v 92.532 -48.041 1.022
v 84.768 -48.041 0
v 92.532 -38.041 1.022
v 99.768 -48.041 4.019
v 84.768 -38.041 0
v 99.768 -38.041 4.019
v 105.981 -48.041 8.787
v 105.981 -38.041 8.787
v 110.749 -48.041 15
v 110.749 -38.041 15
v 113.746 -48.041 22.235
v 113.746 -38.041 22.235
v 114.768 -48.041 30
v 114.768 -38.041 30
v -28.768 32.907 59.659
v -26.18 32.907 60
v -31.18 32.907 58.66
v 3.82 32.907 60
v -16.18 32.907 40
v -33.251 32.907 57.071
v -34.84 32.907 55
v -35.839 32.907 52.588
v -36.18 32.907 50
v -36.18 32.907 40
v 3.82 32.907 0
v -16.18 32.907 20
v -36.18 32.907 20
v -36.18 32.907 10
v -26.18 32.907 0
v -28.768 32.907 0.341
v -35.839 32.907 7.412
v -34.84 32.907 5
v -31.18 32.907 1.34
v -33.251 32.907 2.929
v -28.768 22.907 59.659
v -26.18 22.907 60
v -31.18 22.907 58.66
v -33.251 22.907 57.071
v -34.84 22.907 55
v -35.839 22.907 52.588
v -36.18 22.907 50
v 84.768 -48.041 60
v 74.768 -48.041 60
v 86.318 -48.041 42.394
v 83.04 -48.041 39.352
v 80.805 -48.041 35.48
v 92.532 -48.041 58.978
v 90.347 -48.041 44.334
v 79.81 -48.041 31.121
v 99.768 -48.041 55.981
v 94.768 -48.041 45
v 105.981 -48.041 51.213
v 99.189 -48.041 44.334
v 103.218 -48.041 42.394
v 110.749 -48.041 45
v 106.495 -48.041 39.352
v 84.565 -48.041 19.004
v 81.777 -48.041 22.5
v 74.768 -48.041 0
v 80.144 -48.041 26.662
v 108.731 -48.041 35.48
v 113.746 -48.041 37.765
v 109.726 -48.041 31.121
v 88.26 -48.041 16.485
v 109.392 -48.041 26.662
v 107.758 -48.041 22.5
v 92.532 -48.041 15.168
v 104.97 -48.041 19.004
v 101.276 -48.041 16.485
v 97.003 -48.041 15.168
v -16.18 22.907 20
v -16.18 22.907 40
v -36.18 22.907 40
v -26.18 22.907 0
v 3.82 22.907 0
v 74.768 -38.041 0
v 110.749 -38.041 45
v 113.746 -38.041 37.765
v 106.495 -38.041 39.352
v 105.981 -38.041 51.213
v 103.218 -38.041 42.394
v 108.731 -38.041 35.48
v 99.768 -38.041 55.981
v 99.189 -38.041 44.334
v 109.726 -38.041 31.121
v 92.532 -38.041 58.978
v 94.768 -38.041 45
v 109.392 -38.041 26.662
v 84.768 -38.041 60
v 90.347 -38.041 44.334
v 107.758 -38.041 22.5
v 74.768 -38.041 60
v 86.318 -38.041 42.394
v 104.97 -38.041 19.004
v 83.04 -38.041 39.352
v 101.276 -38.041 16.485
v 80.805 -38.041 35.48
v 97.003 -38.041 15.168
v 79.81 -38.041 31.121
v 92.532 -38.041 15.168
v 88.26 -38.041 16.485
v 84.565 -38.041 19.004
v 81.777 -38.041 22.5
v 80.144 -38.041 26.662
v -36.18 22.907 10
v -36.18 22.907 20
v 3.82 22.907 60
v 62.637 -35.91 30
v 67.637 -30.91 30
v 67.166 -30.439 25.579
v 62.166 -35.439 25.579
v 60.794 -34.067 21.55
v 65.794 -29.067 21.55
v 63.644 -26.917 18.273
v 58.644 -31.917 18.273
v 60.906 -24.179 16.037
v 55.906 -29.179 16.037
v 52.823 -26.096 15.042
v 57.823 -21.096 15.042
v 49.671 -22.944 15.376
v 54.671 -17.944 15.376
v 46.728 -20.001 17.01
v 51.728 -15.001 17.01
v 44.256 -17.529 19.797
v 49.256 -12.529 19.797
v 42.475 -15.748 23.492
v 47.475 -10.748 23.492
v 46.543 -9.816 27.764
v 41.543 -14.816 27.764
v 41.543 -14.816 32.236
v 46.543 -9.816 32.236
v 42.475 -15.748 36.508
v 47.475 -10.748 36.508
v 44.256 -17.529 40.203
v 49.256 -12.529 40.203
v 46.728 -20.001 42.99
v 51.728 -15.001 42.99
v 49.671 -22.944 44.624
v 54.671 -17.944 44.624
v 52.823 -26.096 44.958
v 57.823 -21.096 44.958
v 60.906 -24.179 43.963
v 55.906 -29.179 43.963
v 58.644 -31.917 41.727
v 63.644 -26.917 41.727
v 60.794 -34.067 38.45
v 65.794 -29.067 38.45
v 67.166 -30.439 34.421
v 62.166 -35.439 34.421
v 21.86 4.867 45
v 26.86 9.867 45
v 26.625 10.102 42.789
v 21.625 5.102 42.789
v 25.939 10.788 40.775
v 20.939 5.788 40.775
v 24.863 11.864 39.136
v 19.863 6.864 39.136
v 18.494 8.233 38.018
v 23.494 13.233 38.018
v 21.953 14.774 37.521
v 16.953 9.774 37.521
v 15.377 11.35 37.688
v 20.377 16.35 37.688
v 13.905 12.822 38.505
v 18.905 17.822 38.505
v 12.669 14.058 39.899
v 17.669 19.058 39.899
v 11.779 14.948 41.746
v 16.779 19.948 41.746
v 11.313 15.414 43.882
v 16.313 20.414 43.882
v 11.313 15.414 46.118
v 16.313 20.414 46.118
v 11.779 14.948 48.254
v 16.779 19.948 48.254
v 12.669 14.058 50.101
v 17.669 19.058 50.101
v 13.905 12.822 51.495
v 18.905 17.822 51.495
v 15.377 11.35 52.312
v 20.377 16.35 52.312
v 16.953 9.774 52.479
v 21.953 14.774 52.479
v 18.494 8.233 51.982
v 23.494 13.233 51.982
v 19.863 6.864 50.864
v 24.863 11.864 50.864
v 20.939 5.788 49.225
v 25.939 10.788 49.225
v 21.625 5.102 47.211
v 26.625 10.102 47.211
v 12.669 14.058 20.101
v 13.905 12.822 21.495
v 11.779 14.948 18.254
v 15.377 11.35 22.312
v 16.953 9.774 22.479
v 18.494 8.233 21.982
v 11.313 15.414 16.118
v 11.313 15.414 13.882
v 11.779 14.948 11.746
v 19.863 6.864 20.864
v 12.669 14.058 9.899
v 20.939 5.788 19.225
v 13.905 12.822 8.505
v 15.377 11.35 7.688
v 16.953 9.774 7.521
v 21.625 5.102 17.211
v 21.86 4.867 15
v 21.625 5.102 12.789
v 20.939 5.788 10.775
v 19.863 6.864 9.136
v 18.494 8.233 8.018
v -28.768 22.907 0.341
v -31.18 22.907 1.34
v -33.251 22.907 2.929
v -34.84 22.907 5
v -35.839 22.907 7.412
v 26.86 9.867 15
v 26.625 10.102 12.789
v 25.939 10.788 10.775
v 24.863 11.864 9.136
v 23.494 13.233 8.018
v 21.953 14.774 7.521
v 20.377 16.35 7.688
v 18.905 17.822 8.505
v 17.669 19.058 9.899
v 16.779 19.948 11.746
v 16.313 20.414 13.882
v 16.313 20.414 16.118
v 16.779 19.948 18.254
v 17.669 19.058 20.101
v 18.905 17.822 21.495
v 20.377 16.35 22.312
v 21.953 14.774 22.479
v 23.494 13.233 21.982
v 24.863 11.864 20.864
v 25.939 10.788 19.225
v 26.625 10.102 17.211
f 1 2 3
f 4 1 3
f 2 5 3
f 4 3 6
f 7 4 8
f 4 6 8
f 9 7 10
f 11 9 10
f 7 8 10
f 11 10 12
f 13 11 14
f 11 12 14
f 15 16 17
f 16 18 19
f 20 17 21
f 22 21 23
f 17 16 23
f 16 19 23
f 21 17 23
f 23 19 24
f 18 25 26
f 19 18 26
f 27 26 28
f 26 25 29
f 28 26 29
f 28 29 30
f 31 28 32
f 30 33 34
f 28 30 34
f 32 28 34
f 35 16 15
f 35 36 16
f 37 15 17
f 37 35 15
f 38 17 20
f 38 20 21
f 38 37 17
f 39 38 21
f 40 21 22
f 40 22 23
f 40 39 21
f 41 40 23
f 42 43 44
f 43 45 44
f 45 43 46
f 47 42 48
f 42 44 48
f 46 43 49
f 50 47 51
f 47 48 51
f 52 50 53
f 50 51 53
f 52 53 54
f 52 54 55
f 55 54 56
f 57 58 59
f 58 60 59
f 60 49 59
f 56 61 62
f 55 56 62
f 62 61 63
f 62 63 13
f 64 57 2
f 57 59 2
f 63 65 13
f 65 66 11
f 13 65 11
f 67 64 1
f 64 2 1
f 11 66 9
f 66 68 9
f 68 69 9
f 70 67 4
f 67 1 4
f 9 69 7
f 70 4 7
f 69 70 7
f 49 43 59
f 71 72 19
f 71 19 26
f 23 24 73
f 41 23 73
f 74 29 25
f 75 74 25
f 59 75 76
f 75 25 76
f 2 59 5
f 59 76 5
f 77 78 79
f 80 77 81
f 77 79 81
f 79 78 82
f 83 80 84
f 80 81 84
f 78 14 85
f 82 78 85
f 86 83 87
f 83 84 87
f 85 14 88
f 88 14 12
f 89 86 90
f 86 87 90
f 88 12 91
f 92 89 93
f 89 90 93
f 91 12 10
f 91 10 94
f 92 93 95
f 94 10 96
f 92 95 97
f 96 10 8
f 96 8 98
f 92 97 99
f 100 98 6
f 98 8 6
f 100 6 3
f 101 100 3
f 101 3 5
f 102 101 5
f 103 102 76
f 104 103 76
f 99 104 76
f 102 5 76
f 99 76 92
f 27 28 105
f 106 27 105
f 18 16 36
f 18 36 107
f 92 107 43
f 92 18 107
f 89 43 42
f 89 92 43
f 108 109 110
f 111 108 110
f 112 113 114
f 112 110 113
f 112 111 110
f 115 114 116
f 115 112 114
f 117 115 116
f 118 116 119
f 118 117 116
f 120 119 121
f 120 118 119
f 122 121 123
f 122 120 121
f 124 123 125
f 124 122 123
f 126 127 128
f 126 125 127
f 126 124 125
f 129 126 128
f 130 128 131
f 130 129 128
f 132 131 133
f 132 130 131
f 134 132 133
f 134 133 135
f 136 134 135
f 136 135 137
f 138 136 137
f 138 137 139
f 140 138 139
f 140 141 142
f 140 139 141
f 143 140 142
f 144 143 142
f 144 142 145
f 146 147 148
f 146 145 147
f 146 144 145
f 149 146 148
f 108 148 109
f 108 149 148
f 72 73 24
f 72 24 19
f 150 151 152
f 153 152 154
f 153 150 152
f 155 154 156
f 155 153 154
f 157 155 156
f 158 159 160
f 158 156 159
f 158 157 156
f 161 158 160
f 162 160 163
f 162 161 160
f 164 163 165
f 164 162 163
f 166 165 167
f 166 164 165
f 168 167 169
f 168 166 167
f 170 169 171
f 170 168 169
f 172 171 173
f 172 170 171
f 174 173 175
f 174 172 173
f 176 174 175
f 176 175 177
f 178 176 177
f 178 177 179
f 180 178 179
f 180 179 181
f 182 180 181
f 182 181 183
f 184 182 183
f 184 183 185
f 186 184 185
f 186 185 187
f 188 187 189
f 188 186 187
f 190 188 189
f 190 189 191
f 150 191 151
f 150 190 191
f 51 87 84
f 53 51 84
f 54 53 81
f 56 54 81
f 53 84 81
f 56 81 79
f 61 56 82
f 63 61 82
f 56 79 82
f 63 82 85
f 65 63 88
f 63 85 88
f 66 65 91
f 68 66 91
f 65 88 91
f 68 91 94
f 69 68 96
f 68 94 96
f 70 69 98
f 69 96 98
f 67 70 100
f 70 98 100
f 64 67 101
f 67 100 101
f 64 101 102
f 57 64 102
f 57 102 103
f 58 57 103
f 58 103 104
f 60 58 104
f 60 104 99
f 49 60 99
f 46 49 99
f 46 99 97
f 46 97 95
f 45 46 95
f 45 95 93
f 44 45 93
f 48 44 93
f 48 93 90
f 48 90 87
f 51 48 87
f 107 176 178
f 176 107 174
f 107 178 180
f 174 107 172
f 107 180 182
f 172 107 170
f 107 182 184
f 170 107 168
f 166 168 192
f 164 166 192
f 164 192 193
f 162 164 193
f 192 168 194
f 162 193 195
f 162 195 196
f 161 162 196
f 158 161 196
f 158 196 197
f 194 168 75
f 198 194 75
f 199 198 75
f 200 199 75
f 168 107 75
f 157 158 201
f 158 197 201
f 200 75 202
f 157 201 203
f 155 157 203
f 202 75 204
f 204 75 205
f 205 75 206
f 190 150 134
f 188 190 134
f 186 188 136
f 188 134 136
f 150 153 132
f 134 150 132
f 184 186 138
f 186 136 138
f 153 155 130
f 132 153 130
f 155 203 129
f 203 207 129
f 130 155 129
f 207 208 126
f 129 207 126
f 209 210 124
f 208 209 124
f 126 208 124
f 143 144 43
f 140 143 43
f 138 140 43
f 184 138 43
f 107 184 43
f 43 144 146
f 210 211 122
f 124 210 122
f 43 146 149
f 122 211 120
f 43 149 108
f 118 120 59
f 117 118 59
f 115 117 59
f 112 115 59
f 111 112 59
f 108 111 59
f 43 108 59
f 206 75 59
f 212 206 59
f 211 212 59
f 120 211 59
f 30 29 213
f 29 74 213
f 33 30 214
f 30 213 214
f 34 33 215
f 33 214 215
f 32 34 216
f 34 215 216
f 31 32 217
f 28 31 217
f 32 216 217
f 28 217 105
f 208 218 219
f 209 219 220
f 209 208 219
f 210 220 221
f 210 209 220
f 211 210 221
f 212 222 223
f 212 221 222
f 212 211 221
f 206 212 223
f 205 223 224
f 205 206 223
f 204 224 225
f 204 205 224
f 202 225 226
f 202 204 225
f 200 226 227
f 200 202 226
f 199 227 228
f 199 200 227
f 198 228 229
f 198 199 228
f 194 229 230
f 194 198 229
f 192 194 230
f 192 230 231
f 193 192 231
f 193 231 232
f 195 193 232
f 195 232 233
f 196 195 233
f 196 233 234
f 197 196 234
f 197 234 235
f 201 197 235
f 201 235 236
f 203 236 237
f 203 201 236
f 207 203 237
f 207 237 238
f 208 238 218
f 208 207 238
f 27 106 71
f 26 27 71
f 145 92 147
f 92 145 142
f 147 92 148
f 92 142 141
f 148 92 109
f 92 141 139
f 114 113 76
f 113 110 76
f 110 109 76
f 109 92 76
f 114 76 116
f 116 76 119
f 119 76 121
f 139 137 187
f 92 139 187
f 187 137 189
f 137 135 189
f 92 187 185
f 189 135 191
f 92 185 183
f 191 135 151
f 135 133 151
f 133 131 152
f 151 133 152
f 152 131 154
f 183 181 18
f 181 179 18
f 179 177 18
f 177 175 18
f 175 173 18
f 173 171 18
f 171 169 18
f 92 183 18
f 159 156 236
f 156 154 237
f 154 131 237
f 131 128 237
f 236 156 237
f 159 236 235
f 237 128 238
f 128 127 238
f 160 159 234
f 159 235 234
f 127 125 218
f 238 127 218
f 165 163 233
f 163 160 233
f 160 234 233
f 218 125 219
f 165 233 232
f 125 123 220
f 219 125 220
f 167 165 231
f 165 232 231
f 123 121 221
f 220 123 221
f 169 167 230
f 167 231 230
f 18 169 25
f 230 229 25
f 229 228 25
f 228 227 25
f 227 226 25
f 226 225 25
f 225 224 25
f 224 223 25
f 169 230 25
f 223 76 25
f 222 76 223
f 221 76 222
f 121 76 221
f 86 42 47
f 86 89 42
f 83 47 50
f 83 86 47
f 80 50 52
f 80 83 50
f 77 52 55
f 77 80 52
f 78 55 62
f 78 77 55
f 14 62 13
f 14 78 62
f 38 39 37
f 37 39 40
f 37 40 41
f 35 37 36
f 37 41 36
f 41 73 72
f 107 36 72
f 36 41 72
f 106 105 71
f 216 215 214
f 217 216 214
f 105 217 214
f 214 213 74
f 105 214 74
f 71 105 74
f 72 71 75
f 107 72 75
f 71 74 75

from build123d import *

# Parameters (mm, degrees)
SALIENTE_EXTRUIR1_DEPTH    = 60
CROQUIS3_W                 = 40
CROQUIS3_H                 = 20
CORTAR_EXTRUIR1_DEPTH      = 46
CROQUIS4_R                 = 15
CORTAR_EXTRUIR5_DEPTH      = 57
CORTAR_EXTRUIR6_DEPTH      = 16
CORTAR_EXTRUIR6_DEPTH_BACK = 19
CROQUIS12_R                = 7.5
CROQUIS12_R_2              = 15
REDONDEO2_R                = 10
REDONDEO3_R                = 30


with BuildPart() as part:
    # Croquis2 → Saliente-Extruir1 (new body)
    with BuildSketch(Plane.XY):
        Polygon((-36.180131723, 22.907142857), (3.819868277, 22.907142857), (74.767829948, -48.040818814), (114.767829948, -48.040818814), (114.767829948, -38.040818814), (74.767829948, -38.040818814), (3.819868277, 32.907142857), (-36.180131723, 32.907142857), align=None)
    extrude(amount=SALIENTE_EXTRUIR1_DEPTH)

    # Croquis3 → Cortar-Extruir1 (cut)
    with BuildSketch(Plane(origin=(0, 0, 0), x_dir=(1, 0, 0), z_dir=(0, 1, 0))):
        with Locations((-36.180131723, -30)):
            Rectangle(CROQUIS3_W, CROQUIS3_H)
    extrude(amount=CORTAR_EXTRUIR1_DEPTH, mode=Mode.SUBTRACT)

    # Croquis4 → Cortar-Extruir5 (cut)
    with BuildSketch(Plane(origin=(0, 0, 0), x_dir=(1, 0, 0), z_dir=(0, 1, 0))):
        with Locations(Location((94.767829948, -30, 0), (0, 0, 270))):
            Circle(CROQUIS4_R)
    extrude(amount=-CORTAR_EXTRUIR5_DEPTH, mode=Mode.SUBTRACT)

    # Croquis12 → Cortar-Extruir6 (cut, two sides: drawn at the far end of the back side and taken through both)
    with BuildSketch(Plane(origin=(18.363505567, 18.363505567, 0), x_dir=(0, 0, -1), z_dir=(0.7071067811865486, 0.7071067811865465, 0)).offset(-CORTAR_EXTRUIR6_DEPTH_BACK)):
        with Locations(Location((-15, -4.516083302, 0), (0, 0, 270))):
            Circle(CROQUIS12_R)
        with Locations(Location((-45, -4.516083302, 0), (0, 0, 270))):
            Circle(CROQUIS12_R)
        with Locations(Location((-30, -54.683868112, 0), (0, 0, 270))):
            Circle(CROQUIS12_R_2)
    extrude(amount=CORTAR_EXTRUIR6_DEPTH + CORTAR_EXTRUIR6_DEPTH_BACK, mode=Mode.SUBTRACT)

    # Redondeo2
    redondeo2_edges = [part.edges().sort_by_distance(p)[0] for p in [
        (-36.180131723, 27.907142857, 0),
        (-36.180131723, 27.907142857, 60),
    ]]
    fillet(redondeo2_edges, radius=REDONDEO2_R)

    # Redondeo3
    redondeo3_edges = [part.edges().sort_by_distance(p)[0] for p in [
        (114.767829948, -43.040818814, 60),
        (114.767829948, -43.040818814, 0),
    ]]
    fillet(redondeo3_edges, radius=REDONDEO3_R - 0.0001)  # a hair under: the kernel refuses the full size


solid = part.part
